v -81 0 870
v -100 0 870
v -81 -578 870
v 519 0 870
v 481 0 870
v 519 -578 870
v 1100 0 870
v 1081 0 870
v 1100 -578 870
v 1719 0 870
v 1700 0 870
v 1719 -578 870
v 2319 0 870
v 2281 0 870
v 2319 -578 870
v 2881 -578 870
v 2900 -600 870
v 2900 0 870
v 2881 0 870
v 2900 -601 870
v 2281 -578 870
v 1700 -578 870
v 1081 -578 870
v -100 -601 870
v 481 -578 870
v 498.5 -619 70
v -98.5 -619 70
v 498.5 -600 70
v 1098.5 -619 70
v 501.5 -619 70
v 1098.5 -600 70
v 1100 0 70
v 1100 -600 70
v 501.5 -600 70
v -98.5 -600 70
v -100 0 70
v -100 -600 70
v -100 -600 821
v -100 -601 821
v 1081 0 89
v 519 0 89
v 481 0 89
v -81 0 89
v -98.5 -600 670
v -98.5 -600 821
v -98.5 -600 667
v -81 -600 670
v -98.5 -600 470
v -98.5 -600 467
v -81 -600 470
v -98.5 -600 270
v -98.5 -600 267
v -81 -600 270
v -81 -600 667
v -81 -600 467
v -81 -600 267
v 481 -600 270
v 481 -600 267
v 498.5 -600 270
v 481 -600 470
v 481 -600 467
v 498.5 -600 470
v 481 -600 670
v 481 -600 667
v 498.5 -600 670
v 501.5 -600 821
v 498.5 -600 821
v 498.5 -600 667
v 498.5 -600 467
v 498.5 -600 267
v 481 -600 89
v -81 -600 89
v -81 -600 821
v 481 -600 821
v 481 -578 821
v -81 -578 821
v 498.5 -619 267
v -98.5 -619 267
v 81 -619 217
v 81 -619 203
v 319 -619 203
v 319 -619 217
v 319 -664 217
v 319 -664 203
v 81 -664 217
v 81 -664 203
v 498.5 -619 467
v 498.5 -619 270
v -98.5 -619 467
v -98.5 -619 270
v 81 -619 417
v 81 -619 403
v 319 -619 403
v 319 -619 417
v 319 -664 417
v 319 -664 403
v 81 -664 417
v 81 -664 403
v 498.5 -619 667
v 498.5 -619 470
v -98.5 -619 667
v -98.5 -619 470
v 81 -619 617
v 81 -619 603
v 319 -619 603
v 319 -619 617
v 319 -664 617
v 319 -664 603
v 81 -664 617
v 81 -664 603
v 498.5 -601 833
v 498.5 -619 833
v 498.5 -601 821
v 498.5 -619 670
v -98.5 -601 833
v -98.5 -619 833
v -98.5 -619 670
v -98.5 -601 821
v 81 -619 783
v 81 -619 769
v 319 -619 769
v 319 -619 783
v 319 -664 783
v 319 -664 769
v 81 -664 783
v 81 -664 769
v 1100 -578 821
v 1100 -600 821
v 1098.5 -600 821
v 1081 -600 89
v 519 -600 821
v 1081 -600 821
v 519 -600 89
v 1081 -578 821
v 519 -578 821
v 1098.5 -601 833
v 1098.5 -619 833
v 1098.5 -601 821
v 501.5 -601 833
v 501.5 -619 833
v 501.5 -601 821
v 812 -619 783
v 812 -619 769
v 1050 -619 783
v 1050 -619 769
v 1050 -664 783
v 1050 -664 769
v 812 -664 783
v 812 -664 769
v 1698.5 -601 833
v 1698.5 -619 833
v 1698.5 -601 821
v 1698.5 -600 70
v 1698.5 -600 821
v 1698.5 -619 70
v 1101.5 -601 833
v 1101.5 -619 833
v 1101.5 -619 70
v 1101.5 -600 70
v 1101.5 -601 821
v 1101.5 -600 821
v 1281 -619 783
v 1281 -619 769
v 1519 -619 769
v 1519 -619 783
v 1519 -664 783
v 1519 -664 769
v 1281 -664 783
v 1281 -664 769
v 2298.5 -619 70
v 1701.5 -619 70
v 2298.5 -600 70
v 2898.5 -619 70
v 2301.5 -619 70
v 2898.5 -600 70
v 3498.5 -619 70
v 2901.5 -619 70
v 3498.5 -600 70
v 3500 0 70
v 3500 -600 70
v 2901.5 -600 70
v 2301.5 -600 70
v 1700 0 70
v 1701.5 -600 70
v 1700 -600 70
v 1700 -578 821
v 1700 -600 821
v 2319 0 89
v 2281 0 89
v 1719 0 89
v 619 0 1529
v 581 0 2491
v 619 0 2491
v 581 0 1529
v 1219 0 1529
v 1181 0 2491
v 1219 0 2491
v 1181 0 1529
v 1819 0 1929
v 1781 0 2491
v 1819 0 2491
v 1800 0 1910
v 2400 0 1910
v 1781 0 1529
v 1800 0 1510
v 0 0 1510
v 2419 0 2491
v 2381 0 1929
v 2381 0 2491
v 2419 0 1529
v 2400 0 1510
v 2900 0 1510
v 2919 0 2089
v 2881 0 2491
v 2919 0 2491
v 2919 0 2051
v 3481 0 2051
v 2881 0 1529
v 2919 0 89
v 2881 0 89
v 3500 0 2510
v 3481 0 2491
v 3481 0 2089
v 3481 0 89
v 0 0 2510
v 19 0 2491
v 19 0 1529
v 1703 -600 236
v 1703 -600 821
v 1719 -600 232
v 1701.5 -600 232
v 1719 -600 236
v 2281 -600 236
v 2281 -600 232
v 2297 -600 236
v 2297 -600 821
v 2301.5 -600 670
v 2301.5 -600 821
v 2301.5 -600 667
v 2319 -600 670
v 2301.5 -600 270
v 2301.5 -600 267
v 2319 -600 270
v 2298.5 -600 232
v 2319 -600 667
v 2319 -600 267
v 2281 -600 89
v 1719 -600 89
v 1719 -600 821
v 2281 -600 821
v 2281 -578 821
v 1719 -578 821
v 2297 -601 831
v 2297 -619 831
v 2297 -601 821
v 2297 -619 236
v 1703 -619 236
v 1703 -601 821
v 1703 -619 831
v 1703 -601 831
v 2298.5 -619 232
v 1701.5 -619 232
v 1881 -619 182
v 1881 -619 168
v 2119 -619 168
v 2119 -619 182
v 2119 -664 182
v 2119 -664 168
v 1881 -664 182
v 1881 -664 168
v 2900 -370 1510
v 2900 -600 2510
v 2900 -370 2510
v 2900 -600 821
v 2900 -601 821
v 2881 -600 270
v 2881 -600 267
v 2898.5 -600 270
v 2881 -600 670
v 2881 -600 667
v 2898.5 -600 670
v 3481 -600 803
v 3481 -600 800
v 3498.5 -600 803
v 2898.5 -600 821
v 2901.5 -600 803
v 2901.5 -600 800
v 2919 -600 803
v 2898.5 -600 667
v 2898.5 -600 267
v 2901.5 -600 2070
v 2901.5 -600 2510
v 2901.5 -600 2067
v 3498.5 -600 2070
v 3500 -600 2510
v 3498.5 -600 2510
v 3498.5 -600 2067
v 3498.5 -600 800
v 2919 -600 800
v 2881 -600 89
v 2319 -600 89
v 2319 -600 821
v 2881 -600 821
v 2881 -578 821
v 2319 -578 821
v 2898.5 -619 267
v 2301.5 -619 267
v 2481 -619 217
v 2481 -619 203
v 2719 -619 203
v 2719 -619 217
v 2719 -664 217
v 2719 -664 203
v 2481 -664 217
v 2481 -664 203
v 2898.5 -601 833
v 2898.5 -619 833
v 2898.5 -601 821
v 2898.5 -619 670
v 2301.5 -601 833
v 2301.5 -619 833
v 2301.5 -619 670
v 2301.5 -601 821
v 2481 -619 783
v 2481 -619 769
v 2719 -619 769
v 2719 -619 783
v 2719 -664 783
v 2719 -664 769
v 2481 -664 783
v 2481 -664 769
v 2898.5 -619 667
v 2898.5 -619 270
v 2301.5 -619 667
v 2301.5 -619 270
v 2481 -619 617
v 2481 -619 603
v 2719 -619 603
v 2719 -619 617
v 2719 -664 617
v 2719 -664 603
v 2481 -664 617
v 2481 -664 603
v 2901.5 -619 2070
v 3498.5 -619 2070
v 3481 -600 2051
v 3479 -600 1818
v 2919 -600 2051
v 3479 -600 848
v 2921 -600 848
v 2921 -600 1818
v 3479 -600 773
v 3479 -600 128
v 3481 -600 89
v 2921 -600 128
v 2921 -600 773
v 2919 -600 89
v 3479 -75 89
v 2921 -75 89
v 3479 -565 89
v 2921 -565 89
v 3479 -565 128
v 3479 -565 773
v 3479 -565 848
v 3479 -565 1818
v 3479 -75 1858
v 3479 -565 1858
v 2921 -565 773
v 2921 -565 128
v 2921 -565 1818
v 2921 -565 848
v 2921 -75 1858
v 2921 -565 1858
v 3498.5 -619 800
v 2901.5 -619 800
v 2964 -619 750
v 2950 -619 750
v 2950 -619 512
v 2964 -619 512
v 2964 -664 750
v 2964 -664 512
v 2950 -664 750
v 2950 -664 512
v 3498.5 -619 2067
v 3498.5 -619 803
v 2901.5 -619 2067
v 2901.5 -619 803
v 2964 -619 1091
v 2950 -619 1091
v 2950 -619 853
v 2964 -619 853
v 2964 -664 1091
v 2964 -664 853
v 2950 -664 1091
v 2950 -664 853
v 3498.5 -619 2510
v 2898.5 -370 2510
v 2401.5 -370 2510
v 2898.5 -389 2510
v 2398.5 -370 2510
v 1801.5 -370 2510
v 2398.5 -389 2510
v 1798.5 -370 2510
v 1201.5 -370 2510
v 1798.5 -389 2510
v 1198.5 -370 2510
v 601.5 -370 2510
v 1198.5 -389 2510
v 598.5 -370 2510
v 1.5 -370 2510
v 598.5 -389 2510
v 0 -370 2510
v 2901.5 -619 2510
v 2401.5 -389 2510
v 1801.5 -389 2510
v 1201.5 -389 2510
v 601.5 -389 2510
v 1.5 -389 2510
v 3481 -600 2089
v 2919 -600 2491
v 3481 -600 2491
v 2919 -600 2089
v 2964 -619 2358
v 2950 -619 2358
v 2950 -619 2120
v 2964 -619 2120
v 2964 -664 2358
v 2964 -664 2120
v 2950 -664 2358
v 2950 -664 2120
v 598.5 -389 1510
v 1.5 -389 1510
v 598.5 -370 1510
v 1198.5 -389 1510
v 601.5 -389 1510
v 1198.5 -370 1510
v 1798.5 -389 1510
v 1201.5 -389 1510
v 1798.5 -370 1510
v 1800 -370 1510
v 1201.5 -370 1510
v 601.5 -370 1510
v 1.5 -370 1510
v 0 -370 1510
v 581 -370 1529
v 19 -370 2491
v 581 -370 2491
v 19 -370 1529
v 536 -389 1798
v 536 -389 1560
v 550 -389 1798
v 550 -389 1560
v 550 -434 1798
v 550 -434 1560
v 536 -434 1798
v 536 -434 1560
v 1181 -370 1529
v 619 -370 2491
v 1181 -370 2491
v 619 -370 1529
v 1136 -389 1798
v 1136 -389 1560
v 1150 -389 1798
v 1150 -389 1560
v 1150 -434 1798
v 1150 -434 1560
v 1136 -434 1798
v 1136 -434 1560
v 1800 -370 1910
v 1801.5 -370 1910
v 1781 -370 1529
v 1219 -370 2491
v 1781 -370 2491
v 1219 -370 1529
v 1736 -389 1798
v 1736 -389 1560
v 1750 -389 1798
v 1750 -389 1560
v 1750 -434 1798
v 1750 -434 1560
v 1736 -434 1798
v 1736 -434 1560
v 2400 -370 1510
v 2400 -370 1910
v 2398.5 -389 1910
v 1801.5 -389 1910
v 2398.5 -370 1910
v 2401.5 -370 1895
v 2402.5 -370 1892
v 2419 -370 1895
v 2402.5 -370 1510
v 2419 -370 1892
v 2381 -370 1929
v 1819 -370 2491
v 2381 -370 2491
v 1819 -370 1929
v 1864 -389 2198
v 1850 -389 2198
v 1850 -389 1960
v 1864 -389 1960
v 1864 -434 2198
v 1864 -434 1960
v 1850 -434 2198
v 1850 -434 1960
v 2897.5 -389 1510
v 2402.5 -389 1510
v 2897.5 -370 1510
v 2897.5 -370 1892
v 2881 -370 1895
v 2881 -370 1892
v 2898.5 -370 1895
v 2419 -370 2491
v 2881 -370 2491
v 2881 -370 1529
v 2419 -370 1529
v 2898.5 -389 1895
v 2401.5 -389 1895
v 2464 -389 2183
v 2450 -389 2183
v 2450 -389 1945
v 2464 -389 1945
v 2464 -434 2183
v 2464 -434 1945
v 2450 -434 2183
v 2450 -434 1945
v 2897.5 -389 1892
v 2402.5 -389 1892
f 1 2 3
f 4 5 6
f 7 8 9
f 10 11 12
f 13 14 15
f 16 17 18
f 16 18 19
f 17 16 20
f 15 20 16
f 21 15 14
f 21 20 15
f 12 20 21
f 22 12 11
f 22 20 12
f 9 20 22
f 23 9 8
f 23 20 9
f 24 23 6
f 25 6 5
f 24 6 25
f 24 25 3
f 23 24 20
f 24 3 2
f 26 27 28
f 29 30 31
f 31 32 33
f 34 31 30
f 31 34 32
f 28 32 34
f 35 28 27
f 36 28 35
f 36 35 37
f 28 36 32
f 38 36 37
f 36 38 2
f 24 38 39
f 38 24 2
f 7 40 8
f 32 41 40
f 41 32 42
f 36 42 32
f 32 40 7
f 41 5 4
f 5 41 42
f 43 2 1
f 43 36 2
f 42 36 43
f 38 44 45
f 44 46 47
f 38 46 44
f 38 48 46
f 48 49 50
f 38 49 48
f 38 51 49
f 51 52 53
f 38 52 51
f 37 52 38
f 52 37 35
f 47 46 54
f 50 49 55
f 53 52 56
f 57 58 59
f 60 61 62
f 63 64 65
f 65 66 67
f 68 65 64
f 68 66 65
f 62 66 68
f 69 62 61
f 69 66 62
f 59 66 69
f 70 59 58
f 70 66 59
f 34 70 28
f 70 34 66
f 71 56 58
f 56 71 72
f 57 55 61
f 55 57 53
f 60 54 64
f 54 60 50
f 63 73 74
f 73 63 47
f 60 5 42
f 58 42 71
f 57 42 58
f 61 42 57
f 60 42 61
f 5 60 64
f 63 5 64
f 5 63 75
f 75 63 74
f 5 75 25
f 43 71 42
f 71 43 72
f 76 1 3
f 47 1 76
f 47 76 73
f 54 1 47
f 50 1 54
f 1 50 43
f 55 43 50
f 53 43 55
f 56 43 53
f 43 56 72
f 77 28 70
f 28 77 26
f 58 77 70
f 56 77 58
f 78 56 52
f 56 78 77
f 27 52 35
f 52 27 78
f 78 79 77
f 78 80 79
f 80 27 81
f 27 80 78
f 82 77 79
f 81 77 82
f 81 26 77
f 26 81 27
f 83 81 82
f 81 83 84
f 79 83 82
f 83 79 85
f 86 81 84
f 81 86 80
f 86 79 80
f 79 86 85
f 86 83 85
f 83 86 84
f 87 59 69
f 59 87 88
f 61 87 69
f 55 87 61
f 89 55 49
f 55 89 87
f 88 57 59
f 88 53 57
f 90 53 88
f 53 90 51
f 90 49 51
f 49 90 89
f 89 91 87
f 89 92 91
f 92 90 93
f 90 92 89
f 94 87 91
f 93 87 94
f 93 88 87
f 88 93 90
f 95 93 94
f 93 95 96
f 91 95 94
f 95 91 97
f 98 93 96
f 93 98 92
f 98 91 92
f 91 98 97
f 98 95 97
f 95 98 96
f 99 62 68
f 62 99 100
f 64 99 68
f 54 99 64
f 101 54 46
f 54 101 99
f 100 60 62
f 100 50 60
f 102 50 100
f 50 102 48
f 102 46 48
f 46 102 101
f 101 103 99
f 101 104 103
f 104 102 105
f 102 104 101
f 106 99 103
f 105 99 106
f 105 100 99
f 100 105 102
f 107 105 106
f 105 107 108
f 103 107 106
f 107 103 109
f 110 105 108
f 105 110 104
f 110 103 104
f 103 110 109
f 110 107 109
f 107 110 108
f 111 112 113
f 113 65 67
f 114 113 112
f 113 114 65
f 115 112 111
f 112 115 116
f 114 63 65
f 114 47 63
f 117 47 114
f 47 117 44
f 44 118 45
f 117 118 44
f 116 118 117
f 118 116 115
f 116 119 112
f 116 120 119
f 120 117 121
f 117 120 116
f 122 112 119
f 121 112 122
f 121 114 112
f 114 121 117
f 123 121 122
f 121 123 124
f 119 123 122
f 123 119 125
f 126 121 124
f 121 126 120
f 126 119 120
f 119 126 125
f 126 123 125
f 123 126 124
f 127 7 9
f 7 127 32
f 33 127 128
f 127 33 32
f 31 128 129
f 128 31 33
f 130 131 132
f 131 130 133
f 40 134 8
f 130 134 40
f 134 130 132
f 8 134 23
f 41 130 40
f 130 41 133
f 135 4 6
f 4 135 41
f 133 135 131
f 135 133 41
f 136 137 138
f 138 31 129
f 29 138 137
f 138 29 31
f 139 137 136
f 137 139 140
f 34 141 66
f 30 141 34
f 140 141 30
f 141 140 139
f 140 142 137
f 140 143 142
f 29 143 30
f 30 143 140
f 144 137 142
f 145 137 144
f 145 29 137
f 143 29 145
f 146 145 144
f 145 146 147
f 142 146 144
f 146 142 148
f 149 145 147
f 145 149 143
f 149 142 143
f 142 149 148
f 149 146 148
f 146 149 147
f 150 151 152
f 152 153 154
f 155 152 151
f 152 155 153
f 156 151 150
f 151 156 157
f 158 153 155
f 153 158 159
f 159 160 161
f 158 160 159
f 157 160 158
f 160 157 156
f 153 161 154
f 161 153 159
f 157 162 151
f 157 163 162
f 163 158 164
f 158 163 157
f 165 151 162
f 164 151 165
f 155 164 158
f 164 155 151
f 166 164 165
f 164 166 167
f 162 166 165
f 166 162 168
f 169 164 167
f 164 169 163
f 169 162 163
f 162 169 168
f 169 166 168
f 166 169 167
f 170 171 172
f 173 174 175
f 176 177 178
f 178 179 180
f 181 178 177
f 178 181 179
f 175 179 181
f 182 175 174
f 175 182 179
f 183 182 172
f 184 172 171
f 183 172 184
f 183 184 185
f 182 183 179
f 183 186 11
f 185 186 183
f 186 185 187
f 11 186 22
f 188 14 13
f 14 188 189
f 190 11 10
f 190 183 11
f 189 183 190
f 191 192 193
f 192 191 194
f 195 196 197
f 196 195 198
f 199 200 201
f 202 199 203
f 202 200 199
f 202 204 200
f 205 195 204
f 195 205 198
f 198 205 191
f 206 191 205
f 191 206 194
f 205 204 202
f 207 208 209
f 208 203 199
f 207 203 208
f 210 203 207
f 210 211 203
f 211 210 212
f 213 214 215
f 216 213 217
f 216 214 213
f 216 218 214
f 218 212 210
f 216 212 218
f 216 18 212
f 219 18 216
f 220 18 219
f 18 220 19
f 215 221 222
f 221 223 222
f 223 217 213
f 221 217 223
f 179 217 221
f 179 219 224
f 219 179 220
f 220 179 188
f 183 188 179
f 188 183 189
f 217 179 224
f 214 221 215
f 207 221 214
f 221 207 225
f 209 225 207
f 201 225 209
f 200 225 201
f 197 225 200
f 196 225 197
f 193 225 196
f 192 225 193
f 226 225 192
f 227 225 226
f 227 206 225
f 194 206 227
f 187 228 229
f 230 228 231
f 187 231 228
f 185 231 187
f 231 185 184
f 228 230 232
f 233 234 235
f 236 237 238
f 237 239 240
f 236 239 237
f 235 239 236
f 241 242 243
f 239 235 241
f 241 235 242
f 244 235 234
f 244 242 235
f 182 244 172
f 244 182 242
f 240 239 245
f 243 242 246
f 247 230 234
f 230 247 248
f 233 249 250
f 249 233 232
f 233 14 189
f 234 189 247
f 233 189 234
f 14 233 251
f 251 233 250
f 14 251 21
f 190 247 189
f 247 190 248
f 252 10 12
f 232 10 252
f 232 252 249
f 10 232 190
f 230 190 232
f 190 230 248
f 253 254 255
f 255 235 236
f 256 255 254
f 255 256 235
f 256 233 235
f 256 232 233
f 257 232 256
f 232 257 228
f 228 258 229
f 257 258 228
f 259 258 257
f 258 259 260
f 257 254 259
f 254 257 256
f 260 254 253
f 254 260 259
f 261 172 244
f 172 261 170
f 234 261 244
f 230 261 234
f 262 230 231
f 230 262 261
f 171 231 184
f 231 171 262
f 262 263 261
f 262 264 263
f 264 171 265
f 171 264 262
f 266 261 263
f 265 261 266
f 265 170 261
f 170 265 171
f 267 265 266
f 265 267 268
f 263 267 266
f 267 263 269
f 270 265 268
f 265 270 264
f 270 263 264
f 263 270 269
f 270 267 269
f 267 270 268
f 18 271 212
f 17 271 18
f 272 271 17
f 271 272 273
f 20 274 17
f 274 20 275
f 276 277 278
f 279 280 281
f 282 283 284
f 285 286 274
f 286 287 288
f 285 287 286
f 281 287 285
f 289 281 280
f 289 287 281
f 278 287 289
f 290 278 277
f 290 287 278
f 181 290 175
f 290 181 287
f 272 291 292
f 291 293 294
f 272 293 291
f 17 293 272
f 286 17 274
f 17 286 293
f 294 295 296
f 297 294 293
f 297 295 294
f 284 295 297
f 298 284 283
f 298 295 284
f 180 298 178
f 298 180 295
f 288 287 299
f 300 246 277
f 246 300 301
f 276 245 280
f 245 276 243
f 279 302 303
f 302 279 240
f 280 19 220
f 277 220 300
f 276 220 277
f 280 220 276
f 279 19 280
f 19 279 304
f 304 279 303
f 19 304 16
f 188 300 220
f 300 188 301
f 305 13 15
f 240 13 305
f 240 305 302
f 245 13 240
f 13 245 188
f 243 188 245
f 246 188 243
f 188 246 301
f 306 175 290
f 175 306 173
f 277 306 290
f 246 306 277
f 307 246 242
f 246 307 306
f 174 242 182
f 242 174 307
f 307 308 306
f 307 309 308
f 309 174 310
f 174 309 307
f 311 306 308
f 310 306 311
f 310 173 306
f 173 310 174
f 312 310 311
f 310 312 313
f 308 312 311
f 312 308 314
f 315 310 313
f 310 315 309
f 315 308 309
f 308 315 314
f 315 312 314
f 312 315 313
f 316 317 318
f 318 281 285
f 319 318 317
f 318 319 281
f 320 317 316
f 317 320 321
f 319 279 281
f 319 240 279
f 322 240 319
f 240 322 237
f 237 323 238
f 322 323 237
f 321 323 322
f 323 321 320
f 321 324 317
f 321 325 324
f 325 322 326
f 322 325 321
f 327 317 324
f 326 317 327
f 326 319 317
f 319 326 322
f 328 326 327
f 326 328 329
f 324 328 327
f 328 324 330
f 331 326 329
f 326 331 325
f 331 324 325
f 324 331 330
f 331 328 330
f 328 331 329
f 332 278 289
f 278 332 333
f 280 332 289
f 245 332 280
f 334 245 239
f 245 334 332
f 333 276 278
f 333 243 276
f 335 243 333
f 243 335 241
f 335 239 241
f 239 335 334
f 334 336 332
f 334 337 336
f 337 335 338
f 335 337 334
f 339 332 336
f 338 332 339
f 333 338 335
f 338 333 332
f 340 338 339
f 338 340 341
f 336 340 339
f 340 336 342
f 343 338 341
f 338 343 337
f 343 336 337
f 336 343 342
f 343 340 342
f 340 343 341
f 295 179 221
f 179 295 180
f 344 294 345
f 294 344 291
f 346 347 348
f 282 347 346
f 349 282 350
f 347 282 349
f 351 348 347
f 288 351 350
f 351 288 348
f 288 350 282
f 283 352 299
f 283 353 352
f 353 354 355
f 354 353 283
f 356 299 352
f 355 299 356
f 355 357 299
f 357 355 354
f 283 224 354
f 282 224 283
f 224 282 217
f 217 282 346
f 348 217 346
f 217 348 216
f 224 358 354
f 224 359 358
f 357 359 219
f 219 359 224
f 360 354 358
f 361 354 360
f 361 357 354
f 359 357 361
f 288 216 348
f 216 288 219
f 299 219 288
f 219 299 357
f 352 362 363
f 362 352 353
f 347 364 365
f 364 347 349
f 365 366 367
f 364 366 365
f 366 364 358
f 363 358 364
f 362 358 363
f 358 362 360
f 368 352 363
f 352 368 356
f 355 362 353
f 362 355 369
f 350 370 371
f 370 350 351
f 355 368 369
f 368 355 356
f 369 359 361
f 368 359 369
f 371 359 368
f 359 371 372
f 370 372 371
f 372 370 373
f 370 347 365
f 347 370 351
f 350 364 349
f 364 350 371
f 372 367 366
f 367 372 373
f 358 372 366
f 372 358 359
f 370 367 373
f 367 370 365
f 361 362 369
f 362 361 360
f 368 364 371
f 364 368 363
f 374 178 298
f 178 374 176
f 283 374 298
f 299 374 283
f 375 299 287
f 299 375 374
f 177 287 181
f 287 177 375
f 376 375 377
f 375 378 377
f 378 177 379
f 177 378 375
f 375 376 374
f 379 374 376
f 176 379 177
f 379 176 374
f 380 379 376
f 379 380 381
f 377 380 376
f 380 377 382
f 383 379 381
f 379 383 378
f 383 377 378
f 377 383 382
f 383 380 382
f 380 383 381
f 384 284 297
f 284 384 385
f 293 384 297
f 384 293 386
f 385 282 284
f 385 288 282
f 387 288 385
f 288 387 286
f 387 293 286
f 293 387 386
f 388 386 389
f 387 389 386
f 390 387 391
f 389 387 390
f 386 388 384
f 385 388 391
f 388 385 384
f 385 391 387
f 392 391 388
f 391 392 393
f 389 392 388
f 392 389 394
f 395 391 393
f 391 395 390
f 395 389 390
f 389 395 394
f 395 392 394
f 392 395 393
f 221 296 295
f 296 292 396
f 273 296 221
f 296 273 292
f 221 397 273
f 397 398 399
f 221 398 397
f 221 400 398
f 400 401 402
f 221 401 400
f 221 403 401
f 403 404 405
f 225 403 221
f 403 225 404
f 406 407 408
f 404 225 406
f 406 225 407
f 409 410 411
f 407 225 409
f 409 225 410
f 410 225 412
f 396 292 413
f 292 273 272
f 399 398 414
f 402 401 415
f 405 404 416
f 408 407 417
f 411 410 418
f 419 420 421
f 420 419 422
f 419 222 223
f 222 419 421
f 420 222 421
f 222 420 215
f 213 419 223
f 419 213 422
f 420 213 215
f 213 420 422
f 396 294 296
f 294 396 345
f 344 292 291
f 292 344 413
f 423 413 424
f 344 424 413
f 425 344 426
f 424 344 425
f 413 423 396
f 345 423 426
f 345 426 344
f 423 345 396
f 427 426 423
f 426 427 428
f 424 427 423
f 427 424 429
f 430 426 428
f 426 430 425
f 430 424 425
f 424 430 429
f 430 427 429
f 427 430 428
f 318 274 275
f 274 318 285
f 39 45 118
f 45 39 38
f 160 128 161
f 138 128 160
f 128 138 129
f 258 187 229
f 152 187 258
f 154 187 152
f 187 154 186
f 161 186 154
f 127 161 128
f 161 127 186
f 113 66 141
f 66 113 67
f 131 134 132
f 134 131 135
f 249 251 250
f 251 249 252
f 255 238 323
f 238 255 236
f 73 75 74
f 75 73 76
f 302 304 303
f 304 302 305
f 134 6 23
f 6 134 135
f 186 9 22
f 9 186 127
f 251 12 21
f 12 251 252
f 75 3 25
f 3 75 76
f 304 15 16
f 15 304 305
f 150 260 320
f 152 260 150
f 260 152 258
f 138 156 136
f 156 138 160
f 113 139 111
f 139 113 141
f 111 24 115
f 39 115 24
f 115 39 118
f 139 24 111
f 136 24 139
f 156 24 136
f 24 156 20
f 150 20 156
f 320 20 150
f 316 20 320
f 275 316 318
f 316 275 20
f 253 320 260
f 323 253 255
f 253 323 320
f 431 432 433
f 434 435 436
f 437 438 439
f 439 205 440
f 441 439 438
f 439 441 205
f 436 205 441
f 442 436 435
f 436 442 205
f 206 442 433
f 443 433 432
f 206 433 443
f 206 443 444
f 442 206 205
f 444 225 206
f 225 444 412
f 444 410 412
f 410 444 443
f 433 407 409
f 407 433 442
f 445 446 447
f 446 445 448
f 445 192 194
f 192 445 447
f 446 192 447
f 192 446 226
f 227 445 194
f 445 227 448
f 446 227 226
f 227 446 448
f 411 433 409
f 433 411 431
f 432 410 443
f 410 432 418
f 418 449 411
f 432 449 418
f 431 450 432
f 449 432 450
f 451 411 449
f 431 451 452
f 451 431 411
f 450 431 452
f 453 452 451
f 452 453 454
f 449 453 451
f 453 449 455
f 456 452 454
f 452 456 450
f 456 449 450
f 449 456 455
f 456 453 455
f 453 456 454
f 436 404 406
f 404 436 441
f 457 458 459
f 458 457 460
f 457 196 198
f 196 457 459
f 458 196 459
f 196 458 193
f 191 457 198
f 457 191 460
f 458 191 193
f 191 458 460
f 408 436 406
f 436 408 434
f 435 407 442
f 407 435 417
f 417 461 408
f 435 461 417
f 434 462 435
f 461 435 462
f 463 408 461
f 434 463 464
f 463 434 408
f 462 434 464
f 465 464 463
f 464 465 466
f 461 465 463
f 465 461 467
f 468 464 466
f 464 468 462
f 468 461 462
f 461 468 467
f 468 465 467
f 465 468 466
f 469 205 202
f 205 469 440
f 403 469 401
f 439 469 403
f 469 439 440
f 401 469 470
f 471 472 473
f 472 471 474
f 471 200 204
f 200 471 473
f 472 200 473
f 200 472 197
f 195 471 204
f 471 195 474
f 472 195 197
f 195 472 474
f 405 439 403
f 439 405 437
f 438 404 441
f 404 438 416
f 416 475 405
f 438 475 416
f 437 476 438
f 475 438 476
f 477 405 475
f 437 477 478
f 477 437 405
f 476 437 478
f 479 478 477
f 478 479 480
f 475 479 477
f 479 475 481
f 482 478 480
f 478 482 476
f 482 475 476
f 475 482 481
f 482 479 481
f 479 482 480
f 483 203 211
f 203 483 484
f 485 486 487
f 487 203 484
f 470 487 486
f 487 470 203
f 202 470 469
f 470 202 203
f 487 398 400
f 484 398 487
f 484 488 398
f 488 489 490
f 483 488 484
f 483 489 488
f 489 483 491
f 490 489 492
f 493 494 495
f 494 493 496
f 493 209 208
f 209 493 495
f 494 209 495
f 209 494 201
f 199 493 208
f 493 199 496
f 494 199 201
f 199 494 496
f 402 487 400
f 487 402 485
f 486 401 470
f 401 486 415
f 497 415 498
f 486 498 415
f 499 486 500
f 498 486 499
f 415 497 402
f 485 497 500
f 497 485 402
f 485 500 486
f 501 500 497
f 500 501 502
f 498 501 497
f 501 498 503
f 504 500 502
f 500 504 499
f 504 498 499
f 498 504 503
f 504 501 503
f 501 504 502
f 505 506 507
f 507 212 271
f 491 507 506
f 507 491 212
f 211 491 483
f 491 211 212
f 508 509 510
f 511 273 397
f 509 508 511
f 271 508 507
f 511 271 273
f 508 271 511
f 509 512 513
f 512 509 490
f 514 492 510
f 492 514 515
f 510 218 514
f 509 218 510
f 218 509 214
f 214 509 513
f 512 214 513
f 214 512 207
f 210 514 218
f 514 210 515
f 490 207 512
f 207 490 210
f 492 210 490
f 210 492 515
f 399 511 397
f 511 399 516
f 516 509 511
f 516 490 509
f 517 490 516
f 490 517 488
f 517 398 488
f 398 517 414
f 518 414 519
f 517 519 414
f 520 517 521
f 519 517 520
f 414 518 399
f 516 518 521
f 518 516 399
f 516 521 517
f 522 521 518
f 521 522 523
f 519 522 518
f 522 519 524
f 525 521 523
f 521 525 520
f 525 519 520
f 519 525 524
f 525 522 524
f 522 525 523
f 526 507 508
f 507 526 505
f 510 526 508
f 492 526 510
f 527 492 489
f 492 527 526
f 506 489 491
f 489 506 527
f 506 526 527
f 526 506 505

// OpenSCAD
// Dicke der Seitenwände und Fronten
dicke = 19;

// Luft zwischen den Fronten
luft = 3;

// Höhe des Fliesenspiegels unten und oben
fliesenspiegelUnten = 910;
fliesenspiegelOben = fliesenspiegelUnten + 600;

// Breiten 60 und 50cm
breite60 = 600;
breite50 = 500;

// Höhe und Tiefe der Unterschränke
hoeheUnter = 800;
tiefeUnter = 600;

// Höhe und Tiefe der Oberschränke
hoeheOber = 1000;
tiefeOber = 370;

// Dicke der Arbeitsplatte
dickeArbeitsplatte = 40;

// Höhe des Sockels
sockel = fliesenspiegelUnten - dickeArbeitsplatte - hoeheUnter;
echo("Sockel", sockel);

// Überstand der Türen in die Griffmulde nach oben
ueberstandOben = 12;
ueberstandUnten = 3;

// Griffmulde oben
hoeheMuldeOben = 49;//49.3;
luftMuldeOben = hoeheMuldeOben - ueberstandOben;
muldeObenZ2 = hoeheUnter;
muldeObenZ1 = muldeObenZ2 - hoeheMuldeOben;

// Griffmulde Mitte
//hoeheGriffMitte = hoeheGriffOben;//63.6;
//griffMitteZ2 = 420;
//griffMitteZ1 = griffMitteZ2 - hoeheGriffMitte;



module Korpus(b, t, h, typ = "") {
    difference() {
        cube([b, t, h], false);
        
        translate([dicke, -1, dicke])
            cube([b-2*dicke, t+2, h-2*dicke], false);  
    }
    if (len(typ) > 0)
        echo(typ, b/10, t/10, h/10);
}
module KorpusUnter(b, t, h, typ = "") {
    difference() {
        cube([b, t, h], false);
        
        translate([dicke, -1, dicke])
            cube([b-2*dicke, t+2, h], false);  
    }
    if (len(typ) > 0)
        echo(typ, b/10, t/10, h/10);
}

module Griffmulde(b, h) {
    color([0, 0, 1])
        cube([b, 23, h], false);
}

// @param H Höhe über Nullpunkt
// @param b Breite
// @param h Höhe der Front
module Front(H, b, h) {
    // Zwischenräume rechts und links
    bm = b - luft;
    //hm = h - luft;
    
    color([1, 1, 1])
        translate([luft/2, -dicke, H])
            cube([bm, dicke, h], false);
    echo("Front", bm, h);
}

// Front mit Griff horizontal oben mittig
// @param H Höhe über Nullpunkt
// @param b Breite
// @param h Höhe der Front
module GriffHOM(H, b, h) {
    Front(H, b, h);
    
    // Griffmaße
    A = 238;
    B = 45;
    O = 14;

    // Abstand von oben
    abstand = 50;
    
    color([1, 1, 1])
        translate([(b - A)/2, -dicke - B, H + h - abstand - O])
            cube([A, B, O], false);
}

// Front mit Griff horizontal oben rechts
// @param H Höhe über Nullpunkt
// @param b Breite
// @param h Höhe der Front
module GriffHOR(H, b, h) {
    Front(H, b, h);
    
    // Griffmaße
    A = 238;
    B = 45;
    O = 14;

    // Abstand von oben und rechts
    abstand = 50;
    
    color([1, 1, 1])
        translate([b - A - abstand, -dicke - B, H + h - abstand - O])
            cube([A, B, O], false);
}

// Front mit Griff horizontal unten rechts
// @param H Höhe über Nullpunkt
// @param b Breite
// @param h Höhe der Front
/*module GriffHUR(H, b, h) {
    Front(H, b, h);
    
    // Griffmaße
    A = 238;
    B = 45;
    O = 14;

    // Abstand von oben und rechts
    abstand = 50;
    
    color([1, 1, 1])
        translate([b - A - abstand, -dicke - B, H + h - abstand - O])
            cube([A, B, O], false);
}*/

// Front mit Griff vertikal oben links
// @param H Höhe über Nullpunkt
// @param b Breite
// @param h Höhe der Front
module GriffVOL(H, b, h) {
    Front(H, b, h);
    
    // Griffmaße
    A = 238;
    B = 45;
    O = 14;

    // Abstand von oben und links
    abstand = 50;
    
    color([1, 1, 1])
        translate([abstand, -dicke - B, H + h - abstand - A])
            cube([O, B, A], false);
}

// Front mit Griff horizontal unten rechts
// @param H Höhe über Nullpunkt
// @param b Breite
// @param h Höhe der Front
module GriffVUR(H, b, h) {
    Front(H, b, h);
    
    // Griffmaße
    A = 238;
    B = 45;
    O = 14;

    // Abstand von unten und rechts
    abstand = 50;
    
    color([1, 1, 1])
        translate([b - abstand - O, -dicke - B, H + abstand])
            cube([O, B, A], false);
}

// Front mit Griff vertikal unten links
// @param H Höhe über Nullpunkt
// @param b Breite
// @param h Höhe der Front
module GriffVUL(H, b, h) {
    Front(H, b, h);
    
    // Griffmaße
    A = 238;
    B = 45;
    O = 14;

    // Abstand von unten und links
    abstand = 50;
    
    color([1, 1, 1])
        translate([abstand, -dicke - B, H + abstand])
            cube([O, B, A], false);
}

// Ofen
// @param H Höhe über Nullpunkt
module Ofen(H) {
    color([0, 0, 0])
        translate([3, -dicke, H])
            cube([594, dicke, 595 - 96], false);

    color([0.5, 0.5, 0.5])
        translate([3, -dicke, H + 595 - 96])
            cube([594, dicke, 96], false);
}

module Mikrowelle(H) {
    color([0, 0, 0])
        translate([2.5, -dicke, H])
            cube([495, dicke, 382], false);
}


// Unterschränke und Kühlschrank (relativ zum Sockel)
translate([0, -tiefeUnter, sockel]) {
    difference() {
        union() {
            // links: 4 Schubladen
            translate([-100, 0, 0]) {
                KorpusUnter(breite60, tiefeUnter, hoeheUnter, "Unter alt");

                GriffHOM(0, breite60, 200 - luft);
                GriffHOM(200, breite60, 200 - luft);
                GriffHOM(400, breite60, 200 - luft);
                GriffHOM(600, breite60, 200 - luftMuldeOben);
                

                /*
                GriffHOM(0, breite60, griffMitteZ1 + ueberstandOben);
                z = griffMitteZ2 - ueberstandUnten;
                h = griffObenZ1 + ueberstandOben - z;
                GriffHOM(z, breite60, h/2 - luft);
                GriffHOM(z+h/2, breite60, h/2 - luft);
                */
            }
            
            // Spüle
            translate([500, 0, 0]) {
                KorpusUnter(breite60, tiefeUnter, hoeheUnter, "Ofen/Spüle alt");

                GriffHOR(0, breite60, hoeheUnter - luftMuldeOben);
            }
            
            // Geschirrspüler
            translate([1100, 0, 0]) {
                //KorpusUnter(breite60, tiefeUnter, hoeheUnter);
            
                GriffHOM(0, breite60, hoeheUnter - luftMuldeOben);
            }

            // Ofen
            translate([1700, 0, 0]) {
                KorpusUnter(breite60, tiefeUnter, hoeheUnter, "Ofen/Spüle neu");

                Ofen(166);
                GriffHOM(0, breite60, 162);
            }

            // Besteckkasten, 2 Schubladen
            translate([2300, 0, 0]) {
                KorpusUnter(breite60, tiefeUnter, hoeheUnter, "Unter alt");

                GriffHOM(0, breite60, 200 - luft);
                GriffHOM(200, breite60, 400 - luft);
                GriffHOM(600, breite60, 200 - luftMuldeOben);

/*
                GriffHOM(0, breite50, griffMitteZ1 + ueberstandOben);
                z = griffMitteZ2 - ueberstandUnten;
                h = griffObenZ1 + ueberstandOben - z;
                GriffHOM(z, breite50, h/2 - luft);
                GriffHOM(z+h/2, breite50, h/2 - luft);
*/
            }

            // Kühlschrank
            translate([2900, 0, 0]) {
                // Korpus Kühlschrank
                Korpus(breite60, tiefeUnter, 2000, "Kühlschrank neu");
                
                // Kühlschrank
                b = 558;
                h = 1770;
                t = 490;
                translate([(600-b)/2, 0, 18]) {
                    translate([0, 35, 0])
                    cube([b, t, h]);
                
                    color("red", 1.0) {
                        // untere Tür
                        translate([0, 0, 40])
                        cube([b, t, 645]);

                        // obere Tür
                        translate([0, 0, 760])
                        cube([b, t, 970]);
                    }
                    
                }
                
                // Kühlschranktüren
                //uh = 722+18; // max
                //uh = 695+18; // min
                uh = 730;
                GriffVOL(0, breite60, uh);
                GriffVUL(uh + luft, breite60, 2000 - uh - luft * 2);
                
                
                // Korpus über Kühlschrank
                translate([0, 0, 2000]) {
                    h = fliesenspiegelOben + hoeheOber - (2000 + sockel);
                    Korpus(breite60, tiefeUnter, h, "Aufsatz neu");
                    GriffVUL(0, breite60, h);
                }
            }
            
            // Griffmulden
            translate([-100, -1, hoeheUnter - hoeheMuldeOben])
                Griffmulde(4*600+600, hoeheMuldeOben);
            //translate([0, -1, griffMitteZ1])
            //    Griffmulde(600, hoeheGriffMitte);
            //translate([4*600, -1, griffMitteZ1])
            //    Griffmulde(500+19, hoeheGriffMitte);
        }
    } 
}


// Oberschränke (relativ zur Oberkante des Fliesenspiegels)
translate([0, -tiefeOber, fliesenspiegelOben]) {
    translate([0, 0, 0]) {
        Korpus(breite60, tiefeOber, hoeheOber, "Ober neu");
        GriffVUR(0, breite60, hoeheOber);       
    }
    translate([600, 0, 0]) {
        Korpus(breite60, tiefeOber, hoeheOber, "Ober neu");
        GriffVUR(0, breite60, hoeheOber);       
    }
    translate([1200, 0, 0]) {
        Korpus(breite60, tiefeOber, hoeheOber, "Ober neu");
        GriffVUR(0, breite60, hoeheOber);       
    }

    // Wrasenabzug
    translate([1800, 0, hoeheOber - 600]) {
        Korpus(breite60, tiefeOber, 600, "Ober neu");
        GriffVUL(0, breite60, 600);       
    }

    // Mikrowelle
    translate([2400, 0, 0]) {
        Korpus(breite50, tiefeOber, hoeheOber, "Ober neu");
        
        Mikrowelle(0);
        GriffVUL(385, breite50, hoeheOber - 385);
    }
}

echo("2x Abschlussplatte");
